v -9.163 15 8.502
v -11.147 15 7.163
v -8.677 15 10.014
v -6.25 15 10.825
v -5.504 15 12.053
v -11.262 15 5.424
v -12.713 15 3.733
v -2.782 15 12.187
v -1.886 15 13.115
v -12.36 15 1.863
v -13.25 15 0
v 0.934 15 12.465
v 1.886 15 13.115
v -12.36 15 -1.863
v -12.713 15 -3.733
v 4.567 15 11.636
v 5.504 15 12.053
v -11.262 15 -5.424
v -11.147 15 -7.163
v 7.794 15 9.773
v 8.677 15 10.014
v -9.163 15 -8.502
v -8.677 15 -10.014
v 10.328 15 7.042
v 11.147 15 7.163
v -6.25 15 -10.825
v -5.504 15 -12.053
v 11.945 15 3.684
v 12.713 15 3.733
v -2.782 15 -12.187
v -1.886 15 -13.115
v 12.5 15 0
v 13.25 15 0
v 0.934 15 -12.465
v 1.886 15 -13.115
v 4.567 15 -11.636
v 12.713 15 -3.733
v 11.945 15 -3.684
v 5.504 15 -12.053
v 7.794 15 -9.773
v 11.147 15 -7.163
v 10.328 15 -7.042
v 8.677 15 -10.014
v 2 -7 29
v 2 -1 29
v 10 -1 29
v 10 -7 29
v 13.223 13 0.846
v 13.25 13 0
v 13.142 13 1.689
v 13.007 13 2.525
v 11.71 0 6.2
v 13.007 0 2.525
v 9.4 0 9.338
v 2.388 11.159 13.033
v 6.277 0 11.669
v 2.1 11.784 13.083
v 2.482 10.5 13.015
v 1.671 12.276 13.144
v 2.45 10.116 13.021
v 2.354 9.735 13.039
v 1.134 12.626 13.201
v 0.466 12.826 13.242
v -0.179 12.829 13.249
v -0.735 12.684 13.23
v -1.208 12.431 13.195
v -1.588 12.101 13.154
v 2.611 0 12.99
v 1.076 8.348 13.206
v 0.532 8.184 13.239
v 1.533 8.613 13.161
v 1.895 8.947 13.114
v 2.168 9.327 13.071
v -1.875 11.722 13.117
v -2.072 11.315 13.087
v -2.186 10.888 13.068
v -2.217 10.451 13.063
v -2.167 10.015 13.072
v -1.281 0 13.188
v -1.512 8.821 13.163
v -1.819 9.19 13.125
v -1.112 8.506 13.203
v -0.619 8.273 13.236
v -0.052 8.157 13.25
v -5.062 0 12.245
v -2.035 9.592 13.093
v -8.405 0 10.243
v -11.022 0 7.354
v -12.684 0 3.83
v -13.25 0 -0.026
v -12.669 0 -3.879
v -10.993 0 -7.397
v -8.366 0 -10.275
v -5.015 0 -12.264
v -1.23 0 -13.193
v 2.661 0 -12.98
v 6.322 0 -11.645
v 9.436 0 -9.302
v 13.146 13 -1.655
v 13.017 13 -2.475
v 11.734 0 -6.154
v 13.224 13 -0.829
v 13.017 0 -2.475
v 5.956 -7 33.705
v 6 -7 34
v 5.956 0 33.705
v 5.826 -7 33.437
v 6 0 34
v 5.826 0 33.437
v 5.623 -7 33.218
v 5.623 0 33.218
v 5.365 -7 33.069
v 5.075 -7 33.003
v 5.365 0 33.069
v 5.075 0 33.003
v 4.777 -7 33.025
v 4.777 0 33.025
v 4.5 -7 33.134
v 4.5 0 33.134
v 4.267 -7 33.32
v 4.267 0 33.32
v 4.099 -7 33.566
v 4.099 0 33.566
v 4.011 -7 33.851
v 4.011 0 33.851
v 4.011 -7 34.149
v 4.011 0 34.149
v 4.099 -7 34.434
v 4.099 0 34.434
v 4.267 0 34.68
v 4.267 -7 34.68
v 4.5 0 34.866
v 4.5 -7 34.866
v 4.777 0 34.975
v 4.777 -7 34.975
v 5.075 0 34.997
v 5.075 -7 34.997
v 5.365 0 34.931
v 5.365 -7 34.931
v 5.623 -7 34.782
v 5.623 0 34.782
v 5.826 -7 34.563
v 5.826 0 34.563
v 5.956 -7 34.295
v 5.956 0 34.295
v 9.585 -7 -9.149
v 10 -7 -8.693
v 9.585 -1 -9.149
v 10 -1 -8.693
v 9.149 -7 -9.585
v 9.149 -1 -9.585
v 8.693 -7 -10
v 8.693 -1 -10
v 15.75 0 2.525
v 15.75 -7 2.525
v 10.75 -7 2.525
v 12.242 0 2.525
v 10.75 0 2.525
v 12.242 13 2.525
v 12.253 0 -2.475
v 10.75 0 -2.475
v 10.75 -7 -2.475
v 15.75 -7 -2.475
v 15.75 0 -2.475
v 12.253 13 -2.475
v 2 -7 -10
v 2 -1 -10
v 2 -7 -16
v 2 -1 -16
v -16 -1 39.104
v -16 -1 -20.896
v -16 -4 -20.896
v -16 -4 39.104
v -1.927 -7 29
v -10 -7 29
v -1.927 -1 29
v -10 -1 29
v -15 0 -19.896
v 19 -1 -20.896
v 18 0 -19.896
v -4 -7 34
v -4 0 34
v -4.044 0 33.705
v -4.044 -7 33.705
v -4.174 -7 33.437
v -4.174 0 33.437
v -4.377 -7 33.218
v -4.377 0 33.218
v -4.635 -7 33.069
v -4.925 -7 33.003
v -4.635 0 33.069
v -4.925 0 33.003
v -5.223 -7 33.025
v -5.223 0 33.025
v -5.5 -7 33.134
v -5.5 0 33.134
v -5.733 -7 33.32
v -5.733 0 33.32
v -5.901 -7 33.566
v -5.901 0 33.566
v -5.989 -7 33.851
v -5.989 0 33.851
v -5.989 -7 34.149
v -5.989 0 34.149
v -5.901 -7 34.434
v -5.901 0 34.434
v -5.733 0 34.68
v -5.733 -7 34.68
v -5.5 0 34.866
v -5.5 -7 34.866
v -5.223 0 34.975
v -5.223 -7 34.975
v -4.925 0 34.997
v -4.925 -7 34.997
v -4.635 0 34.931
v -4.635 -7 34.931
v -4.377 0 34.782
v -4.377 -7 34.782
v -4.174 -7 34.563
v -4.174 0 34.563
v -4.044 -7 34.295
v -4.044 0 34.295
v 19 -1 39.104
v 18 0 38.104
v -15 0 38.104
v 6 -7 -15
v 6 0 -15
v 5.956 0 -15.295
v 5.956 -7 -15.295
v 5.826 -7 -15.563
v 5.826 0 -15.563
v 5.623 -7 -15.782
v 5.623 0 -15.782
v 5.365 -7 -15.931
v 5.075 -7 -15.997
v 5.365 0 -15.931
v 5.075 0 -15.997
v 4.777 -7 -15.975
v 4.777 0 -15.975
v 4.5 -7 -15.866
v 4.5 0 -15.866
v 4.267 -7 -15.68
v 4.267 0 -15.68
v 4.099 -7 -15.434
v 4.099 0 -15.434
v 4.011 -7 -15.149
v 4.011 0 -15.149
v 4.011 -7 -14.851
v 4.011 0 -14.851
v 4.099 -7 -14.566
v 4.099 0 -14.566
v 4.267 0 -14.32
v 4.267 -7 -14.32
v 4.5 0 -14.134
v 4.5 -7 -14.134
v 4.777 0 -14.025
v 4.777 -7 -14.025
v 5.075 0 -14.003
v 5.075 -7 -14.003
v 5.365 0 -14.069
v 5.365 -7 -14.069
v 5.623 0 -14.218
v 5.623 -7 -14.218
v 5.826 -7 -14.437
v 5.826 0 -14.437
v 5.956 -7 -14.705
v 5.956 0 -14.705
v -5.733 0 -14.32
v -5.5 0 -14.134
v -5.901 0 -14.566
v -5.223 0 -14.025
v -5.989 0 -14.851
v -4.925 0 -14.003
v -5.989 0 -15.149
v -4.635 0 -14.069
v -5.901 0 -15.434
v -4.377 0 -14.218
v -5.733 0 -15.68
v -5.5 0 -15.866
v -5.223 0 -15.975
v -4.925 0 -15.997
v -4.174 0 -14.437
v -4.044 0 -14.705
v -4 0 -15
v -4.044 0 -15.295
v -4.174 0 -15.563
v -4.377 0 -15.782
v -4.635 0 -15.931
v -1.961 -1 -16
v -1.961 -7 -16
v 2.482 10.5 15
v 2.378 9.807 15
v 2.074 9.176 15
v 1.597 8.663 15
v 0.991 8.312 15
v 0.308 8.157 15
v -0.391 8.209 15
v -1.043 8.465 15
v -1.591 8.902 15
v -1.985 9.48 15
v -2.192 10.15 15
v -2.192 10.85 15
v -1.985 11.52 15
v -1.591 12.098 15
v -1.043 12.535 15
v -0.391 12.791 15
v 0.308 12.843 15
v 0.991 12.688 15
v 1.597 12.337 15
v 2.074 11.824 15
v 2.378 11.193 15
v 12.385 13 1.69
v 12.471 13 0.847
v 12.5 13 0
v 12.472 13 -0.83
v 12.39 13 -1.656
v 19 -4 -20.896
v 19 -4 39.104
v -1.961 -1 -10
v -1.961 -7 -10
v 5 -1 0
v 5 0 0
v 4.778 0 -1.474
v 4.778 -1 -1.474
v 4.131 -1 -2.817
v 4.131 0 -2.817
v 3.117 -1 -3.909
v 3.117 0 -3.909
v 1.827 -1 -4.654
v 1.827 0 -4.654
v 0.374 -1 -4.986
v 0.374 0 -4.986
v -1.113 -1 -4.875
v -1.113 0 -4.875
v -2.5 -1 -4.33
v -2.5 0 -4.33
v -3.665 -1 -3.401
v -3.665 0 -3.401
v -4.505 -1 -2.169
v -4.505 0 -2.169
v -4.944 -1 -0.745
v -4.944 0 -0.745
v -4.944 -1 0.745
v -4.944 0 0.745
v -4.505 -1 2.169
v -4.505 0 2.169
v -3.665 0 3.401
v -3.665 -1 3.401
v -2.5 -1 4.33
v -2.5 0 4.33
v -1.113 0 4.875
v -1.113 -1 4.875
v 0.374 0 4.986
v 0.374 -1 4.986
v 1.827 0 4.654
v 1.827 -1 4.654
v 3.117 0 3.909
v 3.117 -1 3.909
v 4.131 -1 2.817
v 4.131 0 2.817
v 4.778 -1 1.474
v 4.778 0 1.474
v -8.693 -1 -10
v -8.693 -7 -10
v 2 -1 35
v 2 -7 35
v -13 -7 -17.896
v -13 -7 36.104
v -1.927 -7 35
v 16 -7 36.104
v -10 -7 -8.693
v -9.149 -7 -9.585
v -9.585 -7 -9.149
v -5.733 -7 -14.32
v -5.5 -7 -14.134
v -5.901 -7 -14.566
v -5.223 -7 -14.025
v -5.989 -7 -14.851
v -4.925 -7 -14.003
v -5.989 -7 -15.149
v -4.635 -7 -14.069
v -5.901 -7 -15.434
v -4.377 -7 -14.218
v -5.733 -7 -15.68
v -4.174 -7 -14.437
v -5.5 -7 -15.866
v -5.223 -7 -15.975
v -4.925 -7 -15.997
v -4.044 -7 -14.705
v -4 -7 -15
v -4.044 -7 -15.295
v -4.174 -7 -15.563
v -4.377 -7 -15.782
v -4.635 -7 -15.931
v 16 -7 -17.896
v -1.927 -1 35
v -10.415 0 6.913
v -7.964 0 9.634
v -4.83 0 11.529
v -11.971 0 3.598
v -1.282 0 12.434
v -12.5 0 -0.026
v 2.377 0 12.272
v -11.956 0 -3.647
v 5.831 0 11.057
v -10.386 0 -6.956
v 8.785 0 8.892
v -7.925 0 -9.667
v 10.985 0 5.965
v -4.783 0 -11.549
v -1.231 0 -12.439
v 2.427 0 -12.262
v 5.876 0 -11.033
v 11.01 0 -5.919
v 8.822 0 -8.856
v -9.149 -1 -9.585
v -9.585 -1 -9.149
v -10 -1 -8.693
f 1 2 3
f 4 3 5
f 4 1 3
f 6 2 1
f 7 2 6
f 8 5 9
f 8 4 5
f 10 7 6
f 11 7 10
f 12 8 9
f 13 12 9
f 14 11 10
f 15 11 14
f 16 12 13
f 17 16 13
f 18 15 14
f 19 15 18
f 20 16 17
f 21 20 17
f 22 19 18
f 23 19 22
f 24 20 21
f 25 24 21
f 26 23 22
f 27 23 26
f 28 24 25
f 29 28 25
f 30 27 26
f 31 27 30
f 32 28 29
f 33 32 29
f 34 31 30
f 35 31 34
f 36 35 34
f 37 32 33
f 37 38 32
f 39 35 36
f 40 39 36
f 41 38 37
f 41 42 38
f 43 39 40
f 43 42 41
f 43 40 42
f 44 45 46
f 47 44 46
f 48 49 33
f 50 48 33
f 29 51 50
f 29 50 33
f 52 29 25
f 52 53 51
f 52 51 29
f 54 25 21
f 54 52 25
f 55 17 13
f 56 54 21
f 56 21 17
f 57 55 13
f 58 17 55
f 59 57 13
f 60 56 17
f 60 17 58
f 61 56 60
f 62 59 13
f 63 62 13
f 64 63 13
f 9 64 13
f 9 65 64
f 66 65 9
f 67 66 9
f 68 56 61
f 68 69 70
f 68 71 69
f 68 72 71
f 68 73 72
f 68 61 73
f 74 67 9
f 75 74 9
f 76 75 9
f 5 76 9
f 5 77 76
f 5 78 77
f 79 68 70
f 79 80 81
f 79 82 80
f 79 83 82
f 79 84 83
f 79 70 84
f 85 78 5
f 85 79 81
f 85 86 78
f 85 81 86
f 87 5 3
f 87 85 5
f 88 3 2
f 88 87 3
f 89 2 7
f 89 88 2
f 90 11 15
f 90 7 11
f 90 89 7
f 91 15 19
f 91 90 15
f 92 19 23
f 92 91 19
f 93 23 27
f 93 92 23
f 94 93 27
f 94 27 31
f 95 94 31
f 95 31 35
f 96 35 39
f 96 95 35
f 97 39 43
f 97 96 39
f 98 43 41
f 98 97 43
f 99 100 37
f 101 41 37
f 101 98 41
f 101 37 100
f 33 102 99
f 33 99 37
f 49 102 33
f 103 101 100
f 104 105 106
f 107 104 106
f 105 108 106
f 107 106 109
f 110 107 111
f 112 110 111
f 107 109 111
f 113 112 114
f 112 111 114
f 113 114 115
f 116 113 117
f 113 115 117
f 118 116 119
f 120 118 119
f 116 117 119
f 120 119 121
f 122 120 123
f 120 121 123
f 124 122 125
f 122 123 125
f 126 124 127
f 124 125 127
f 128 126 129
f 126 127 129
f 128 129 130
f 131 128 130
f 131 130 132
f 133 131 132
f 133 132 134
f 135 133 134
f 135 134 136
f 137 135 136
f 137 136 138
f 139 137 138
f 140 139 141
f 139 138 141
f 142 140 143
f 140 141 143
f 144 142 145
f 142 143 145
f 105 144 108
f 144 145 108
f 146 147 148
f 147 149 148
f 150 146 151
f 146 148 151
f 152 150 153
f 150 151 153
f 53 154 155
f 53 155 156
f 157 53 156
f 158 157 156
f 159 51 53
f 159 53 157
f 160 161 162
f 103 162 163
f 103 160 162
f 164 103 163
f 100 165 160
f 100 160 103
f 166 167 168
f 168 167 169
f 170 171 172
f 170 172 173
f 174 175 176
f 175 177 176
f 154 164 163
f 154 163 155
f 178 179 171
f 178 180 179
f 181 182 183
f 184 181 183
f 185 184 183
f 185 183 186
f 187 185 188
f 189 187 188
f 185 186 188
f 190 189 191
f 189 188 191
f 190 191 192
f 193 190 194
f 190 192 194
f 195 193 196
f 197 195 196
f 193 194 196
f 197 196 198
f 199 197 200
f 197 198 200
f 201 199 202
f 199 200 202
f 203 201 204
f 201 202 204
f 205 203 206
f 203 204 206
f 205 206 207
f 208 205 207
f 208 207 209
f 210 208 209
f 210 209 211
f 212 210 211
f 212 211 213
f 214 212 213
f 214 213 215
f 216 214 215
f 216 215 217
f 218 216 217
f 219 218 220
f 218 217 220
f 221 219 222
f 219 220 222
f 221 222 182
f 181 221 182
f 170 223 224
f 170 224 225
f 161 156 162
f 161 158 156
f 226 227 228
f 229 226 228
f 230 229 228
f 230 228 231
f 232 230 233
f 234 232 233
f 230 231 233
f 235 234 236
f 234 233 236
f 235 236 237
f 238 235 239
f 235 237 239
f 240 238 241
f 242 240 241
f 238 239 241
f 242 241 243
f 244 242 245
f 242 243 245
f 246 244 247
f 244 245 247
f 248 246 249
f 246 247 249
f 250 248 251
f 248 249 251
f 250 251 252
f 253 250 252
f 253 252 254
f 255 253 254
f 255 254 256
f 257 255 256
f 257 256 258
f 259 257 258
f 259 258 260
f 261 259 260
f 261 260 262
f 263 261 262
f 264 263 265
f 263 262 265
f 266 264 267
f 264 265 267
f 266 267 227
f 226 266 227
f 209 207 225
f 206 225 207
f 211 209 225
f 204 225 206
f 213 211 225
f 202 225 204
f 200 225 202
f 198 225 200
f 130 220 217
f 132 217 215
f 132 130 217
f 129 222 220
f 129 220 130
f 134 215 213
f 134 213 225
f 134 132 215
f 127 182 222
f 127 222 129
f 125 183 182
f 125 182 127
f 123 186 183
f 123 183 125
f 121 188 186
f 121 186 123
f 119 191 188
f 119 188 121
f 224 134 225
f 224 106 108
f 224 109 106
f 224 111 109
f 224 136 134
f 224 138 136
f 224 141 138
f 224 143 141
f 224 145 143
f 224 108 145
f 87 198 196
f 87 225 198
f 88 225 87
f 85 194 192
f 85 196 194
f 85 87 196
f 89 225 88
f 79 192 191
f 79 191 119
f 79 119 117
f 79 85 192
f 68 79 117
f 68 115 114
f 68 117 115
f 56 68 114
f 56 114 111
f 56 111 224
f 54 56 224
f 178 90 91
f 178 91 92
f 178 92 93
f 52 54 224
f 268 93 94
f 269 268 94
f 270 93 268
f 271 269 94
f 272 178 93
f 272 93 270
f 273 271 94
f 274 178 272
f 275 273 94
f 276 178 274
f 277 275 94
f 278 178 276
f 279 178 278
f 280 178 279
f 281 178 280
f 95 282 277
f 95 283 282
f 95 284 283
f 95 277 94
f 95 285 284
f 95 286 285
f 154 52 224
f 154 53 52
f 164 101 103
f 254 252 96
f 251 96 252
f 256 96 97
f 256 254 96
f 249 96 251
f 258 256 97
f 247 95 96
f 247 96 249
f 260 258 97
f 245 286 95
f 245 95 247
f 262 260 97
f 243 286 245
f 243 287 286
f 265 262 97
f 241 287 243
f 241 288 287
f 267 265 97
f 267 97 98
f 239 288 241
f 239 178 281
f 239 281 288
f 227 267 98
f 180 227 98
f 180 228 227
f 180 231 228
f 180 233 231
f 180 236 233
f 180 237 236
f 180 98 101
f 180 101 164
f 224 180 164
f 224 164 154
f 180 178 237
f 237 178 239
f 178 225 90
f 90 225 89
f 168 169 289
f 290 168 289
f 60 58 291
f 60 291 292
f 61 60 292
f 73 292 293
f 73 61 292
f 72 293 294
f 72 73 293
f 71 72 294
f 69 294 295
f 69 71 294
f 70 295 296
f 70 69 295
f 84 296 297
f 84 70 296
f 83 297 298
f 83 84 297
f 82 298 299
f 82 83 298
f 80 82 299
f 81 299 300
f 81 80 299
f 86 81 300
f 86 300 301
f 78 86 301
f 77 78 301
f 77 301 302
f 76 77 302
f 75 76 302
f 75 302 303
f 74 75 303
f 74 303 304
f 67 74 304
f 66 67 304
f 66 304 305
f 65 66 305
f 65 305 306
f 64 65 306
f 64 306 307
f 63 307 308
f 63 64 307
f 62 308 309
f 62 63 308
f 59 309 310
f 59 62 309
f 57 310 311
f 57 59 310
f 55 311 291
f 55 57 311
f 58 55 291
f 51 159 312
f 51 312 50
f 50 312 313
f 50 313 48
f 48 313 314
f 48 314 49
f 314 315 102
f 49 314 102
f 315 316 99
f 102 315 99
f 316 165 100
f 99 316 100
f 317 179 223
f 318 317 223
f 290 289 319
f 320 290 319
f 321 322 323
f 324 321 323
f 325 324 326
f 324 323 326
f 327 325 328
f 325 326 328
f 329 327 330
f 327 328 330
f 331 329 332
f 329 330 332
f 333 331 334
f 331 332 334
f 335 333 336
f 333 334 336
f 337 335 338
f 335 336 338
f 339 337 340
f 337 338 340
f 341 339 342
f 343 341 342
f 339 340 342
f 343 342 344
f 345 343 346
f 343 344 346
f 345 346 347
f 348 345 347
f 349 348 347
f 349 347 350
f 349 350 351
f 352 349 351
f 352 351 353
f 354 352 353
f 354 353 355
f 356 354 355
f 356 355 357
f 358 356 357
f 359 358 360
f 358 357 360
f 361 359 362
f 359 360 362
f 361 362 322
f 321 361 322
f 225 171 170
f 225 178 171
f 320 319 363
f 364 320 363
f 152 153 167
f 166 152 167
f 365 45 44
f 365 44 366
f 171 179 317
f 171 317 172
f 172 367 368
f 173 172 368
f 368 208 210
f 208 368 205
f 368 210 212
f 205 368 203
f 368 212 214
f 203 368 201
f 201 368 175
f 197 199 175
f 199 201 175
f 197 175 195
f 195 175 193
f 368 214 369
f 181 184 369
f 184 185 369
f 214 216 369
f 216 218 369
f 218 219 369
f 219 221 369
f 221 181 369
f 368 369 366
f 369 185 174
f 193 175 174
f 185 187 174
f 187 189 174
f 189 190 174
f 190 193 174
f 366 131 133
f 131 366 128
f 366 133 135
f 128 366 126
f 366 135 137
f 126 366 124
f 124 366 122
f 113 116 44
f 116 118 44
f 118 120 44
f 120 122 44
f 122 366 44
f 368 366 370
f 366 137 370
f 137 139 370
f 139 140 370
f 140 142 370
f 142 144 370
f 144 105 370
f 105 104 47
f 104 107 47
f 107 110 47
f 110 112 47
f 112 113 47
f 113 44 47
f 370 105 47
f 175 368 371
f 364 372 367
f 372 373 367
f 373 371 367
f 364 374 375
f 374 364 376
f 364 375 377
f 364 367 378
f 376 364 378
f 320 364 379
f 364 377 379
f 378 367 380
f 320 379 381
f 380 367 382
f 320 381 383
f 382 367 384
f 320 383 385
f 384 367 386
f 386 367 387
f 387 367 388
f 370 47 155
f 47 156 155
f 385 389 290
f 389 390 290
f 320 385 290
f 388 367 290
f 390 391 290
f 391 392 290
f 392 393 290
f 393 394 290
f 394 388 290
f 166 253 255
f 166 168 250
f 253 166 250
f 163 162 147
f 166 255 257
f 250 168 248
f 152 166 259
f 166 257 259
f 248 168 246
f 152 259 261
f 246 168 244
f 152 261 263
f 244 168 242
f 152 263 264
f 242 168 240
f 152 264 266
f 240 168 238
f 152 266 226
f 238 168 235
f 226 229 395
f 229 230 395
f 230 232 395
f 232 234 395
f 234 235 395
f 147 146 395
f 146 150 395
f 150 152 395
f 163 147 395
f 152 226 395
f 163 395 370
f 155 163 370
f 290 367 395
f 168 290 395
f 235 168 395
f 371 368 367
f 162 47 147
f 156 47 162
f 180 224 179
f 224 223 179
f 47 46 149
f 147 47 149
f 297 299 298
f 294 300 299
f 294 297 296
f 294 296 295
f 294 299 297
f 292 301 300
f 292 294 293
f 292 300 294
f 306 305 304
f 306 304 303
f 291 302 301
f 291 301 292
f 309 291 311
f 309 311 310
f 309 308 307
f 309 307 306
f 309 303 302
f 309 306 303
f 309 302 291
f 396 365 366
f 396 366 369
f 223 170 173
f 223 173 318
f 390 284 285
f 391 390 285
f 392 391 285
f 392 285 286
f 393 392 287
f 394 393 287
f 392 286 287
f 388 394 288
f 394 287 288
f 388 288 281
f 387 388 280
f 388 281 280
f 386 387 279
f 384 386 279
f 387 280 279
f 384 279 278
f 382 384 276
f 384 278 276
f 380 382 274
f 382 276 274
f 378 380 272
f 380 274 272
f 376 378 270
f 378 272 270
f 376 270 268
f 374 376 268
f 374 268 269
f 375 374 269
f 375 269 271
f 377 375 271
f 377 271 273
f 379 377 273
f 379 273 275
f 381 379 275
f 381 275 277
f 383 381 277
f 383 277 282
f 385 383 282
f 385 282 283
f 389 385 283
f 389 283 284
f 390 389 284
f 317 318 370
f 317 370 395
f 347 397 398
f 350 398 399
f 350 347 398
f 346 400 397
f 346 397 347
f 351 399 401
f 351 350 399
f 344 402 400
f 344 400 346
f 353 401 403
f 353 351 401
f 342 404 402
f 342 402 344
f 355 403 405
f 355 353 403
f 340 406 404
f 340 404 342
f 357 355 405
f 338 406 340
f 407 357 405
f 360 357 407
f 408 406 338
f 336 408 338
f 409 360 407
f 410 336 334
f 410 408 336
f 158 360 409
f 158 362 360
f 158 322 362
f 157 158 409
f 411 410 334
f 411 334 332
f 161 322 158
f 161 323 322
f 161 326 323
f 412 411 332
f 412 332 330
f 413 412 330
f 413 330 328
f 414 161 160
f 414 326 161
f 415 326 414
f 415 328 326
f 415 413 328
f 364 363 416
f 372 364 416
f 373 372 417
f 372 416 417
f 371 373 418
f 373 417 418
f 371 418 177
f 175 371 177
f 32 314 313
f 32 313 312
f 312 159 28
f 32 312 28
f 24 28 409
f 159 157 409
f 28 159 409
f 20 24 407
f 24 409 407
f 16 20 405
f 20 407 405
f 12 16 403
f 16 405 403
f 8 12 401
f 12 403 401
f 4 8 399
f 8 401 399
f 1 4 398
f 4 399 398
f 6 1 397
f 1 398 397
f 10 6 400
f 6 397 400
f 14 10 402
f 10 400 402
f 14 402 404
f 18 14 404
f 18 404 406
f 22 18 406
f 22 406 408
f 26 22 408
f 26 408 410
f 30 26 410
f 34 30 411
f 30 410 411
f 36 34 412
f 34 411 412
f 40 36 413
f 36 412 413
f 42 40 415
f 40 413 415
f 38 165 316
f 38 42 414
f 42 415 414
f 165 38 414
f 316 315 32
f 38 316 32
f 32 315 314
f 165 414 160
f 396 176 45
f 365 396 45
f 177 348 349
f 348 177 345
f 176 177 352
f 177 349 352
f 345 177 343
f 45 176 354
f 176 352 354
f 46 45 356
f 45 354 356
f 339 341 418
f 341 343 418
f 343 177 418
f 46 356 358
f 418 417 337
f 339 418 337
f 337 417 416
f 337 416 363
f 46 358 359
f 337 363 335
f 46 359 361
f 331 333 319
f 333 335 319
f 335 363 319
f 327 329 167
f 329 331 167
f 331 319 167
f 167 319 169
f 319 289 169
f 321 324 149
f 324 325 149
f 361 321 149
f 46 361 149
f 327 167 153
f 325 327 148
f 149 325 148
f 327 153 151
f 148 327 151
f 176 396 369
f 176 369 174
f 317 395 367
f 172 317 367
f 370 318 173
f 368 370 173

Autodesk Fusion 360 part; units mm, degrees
sketch "Sketch1" plane through (0, 0, 0) normal (0, 1, 0) x (1, 0, 0)
  circle A0 centre (0, 0) radius 13.25
  dimension "d1" = 26.5
extrude "Extrude1" add sketch "Sketch1" along normal blind 15 makes body 1
sketch "Sketch2" plane through (0, 0, 0) normal (0, 0, 1) x (1, 0, 0)
  circle A0 centre (0.132, 10.5) radius 2.35
  dimension "d5" = 4.7
  dimension "d10" = 10.5
extrude "Extrude2" add sketch "Sketch2" along normal blind 15 bodies 1
sketch "Sketch3" plane through (0, 0, 0) normal (0, 1, 0) x (1, 0, 0)
  circle A0 centre (0, 0) radius 12.5
  dimension "d8" = 25
extrude "Extrude3" cut sketch "Sketch3" along normal through all bodies 1
sketch "Sketch4" plane through (0, 0, 0) normal (0, 1, 0) x (1, 0, 0)
  line L0 (-16, -39.1044) -> (19, -39.1044)
  line L1 (19, 20.8956) -> (-16, 20.8956)
  line L2 (-16, 20.8956) -> (-16, -39.1044)
  line L3 (15.75, -2.5252) -> (10.75, -2.5252)
  line L4 (10.75, -2.5252) -> (10.75, 2.4748)
  line L5 (10.75, 2.4748) -> (15.75, 2.4748)
  line L6 (15.75, 2.4748) -> (15.75, -2.5252)
  line L7 (15.75, -2.5252) -> (10.75, 2.4748) construction
  line L8 (10.75, -2.5252) -> (15.75, 2.4748) construction
  circle A0 centre (0, 0) radius 13.25
  line L9 (19, 20.8956) -> (19, -39.1044)
  line L10 (32, -21) -> (64.7832, -21) construction
  line L11 (64.7832, -21) -> (64.7832, -31) construction
  line L12 (64.7832, -31) -> (32, -31) construction
  line L13 (32, -31) -> (32, -21) construction
  line L14 (0, -45) -> (0, 21) construction
  circle A1 centre (-5, 15) radius 1
  circle A2 centre (5, 15) radius 1
  line L15 (-19, 0) -> (28, 0) construction
  circle A3 centre (-5, -34) radius 1
  circle A4 centre (5, -34) radius 1
  line L16 (-10, -29) -> (10, -29)
  line L17 (10, -29) -> (10, 10)
  line L18 (10, 10) -> (-10, 10)
  line L19 (-10, 10) -> (-10, -29)
  circle A5 centre (0, 0) radius 5
  line L20 (-1.9268, -29) -> (2, -29)
  line L21 (2, -29) -> (2, -35)
  line L22 (2, -35) -> (-1.9268, -35)
  line L23 (-1.9268, -35) -> (-1.9268, -29)
  line L24 (-1.9609, 10) -> (2, 10)
  line L25 (2, 10) -> (2, 16)
  line L26 (2, 16) -> (-1.9609, 16)
  line L27 (-1.9609, 16) -> (-1.9609, 10)
  dimension "d13" = 5
  dimension "d14" = 5
  dimension "d15" = 2
  dimension "d16" = 49
  dimension "d23" = 35
  dimension "d24" = 60
  dimension "d25" = 39
  dimension "d26" = 20
  dimension "d27" = 10
  dimension "d28" = 10
  dimension "d29" = 10
extrude "Extrude11" add sketch "Sketch4" against normal blind 7 separate body contours L0 L1 L2 L9 | L3 L4 L5 A0 L17 | A0 L19 | A0 L17 L18 | A0 L18 L19 | A0 L18 L25 | A0 L18 L27 makes body 2
extrude "Extrude10" add sketch "Sketch4" against normal blind 1 contours L0 L1 L2 L9 | L3 L4 L5 A0 L17 | A0 L16 L17 L19 L20 | A0 L17 L18 L19 L24 | A0 L19 | A0 L17 L18 | A0 L18 L19 | L16 L20 L21 L22 L23 | A0 L18 L25 | A0 L18 L27 | A0 L18 L24 L25 L27 | A0 L25 L26 L27 bodies 2 1
extrude "Extrude12" cut sketch "Sketch4" along normal blind 13 contours L3 L5 L6 A0 | L3 L4 L5 A0 bodies 2
chamfer "Chamfer1" distance 3 angle 45 4 edges at (-16, -7, 9.1044) (1.5, -7, 39.1044) (19, -7, 9.1044) (1.5, -7, -20.8956) on bodies 2
chamfer "Chamfer2" distance 1 angle 45 4 edges at (19, 0, 9.1044) (1.5, 0, 39.1044) (-16, 0, 9.1044) (1.5, 0, -20.8956) on bodies 2
